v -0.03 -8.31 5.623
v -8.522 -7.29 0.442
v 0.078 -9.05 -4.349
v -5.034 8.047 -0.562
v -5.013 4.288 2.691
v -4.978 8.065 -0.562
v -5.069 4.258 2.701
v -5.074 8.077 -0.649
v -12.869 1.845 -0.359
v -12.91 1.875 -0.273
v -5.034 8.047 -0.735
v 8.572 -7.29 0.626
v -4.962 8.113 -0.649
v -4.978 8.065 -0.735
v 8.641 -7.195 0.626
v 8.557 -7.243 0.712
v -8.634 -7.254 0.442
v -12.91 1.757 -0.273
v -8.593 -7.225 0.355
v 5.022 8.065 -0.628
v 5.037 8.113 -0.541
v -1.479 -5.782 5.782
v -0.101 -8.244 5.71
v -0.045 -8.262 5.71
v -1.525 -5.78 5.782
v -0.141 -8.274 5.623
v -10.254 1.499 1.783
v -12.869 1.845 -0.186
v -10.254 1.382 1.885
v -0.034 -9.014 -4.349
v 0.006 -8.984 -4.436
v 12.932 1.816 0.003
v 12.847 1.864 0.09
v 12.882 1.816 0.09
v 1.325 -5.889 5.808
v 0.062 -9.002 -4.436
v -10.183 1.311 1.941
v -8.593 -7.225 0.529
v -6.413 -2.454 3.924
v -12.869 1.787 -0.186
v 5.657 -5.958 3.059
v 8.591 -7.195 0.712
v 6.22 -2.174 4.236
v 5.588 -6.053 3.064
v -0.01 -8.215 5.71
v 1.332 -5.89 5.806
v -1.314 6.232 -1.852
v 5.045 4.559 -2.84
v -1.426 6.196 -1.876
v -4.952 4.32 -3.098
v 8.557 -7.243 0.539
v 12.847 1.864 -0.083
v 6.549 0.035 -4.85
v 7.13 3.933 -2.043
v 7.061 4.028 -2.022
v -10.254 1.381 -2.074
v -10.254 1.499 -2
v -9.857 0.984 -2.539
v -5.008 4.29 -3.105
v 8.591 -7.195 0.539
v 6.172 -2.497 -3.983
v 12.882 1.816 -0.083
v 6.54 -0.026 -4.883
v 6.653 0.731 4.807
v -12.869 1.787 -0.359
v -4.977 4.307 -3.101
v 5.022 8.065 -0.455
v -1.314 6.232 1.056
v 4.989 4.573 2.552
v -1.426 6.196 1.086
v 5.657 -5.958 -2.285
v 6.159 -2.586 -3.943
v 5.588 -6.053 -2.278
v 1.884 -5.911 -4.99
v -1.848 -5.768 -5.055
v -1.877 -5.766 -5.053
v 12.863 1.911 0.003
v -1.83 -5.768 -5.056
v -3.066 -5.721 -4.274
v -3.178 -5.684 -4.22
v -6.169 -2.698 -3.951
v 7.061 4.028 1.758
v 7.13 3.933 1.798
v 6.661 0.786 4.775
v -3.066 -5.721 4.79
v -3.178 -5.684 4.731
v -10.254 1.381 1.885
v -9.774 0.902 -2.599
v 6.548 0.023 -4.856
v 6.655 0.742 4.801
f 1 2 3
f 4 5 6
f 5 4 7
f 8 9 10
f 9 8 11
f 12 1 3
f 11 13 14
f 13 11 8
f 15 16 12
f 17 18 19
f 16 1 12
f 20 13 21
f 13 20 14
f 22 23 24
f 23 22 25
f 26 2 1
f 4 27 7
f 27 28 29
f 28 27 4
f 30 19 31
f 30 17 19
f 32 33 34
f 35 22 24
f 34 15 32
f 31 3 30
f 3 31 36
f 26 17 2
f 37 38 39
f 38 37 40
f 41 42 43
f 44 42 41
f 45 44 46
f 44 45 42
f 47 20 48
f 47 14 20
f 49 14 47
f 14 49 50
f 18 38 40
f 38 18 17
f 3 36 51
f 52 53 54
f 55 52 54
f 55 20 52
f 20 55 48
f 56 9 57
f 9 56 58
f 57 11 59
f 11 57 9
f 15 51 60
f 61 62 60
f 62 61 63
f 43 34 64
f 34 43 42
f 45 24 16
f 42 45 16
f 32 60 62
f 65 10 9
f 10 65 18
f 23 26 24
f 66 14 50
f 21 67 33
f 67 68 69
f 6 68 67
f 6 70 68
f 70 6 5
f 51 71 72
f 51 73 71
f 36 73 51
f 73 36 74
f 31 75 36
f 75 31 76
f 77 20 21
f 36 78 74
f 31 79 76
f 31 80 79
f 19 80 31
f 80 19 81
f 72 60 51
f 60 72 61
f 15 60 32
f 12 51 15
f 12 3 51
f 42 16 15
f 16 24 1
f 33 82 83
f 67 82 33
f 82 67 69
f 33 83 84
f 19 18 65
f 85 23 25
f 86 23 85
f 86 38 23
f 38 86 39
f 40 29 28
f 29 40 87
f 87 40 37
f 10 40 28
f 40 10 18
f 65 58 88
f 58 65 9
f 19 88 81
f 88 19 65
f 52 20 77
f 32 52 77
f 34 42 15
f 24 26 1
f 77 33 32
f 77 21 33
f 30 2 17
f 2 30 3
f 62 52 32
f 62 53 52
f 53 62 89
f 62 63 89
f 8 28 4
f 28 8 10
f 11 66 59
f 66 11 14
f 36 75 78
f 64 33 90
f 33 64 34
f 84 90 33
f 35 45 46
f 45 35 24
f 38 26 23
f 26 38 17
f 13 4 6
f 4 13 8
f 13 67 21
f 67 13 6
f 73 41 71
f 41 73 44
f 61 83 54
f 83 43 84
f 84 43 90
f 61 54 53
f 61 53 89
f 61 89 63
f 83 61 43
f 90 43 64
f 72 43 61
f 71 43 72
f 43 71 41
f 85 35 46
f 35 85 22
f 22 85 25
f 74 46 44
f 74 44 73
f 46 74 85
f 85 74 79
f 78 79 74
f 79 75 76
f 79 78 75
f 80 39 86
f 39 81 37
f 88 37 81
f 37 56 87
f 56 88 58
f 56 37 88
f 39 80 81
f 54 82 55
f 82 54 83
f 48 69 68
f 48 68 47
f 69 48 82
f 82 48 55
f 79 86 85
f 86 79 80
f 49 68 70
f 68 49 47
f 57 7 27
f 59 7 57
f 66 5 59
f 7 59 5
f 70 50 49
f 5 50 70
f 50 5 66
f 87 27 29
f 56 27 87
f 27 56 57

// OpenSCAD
// Auto-generated OpenSCAD file

    inner_points = 10*[[-0.13450932832646978, 0.6137208793216535, -0.49999999999996475], [-0.30970268855061545, -0.5625709645316335, -0.5000000000000352], [-0.13450932832643542, 0.6137208793215885, 0.5000000000000352], [-0.3097026885505811, -0.5625709645316985, 0.49999999999996475], [-0.4022234175933843, 0.052401101187175045, -1.283102338831261], [-0.40222341759329616, 0.05240110118700812, 1.283102338831277], [0.4915267827134717, -0.08071135862540943, -0.8547430824889966], [0.49152678271353045, -0.08071135862552062, 0.8547430824889337], [-1.017331462216076, 0.14401343855176083, -0.499999999999965], [-1.0173314622160416, 0.1440134385516957, 0.500000000000035], [0.7029977653621209, 0.39330793047033674, -7.860303774857193e-15], [0.555685674258319, -0.5957821300472206, -6.713421756971425e-14]];

    outer_points = 10*[[-0.4935961942844095, -0.04399878007182188, -0.5983441385906083], [-0.5063460204819994, 0.04399878007182188, 0.5875939233346719], [0.5063460204819994, -0.04399878007182188, -0.5875939233346719], [0.4935961942844095, 0.04399878007182188, 0.5983441385906083], [-1.2828833411617955, 0.18160496168964152, -0.027267303587311748], [1.283173047764001, 0.18160496168964152, 0.00031994908835159333], [-0.8552676058642261, -0.7195265371946491, 0.04419460685783971], [0.8541197760563402, -0.7195265371946491, 0.06257195110839778], [-0.49933157435504716, 0.8017930567931236, -0.06486192322812147], [0.5006106404113617, 0.8017930567931236, -0.05411170797218501], [0.004675625240909675, -0.8954762230599844, -0.43490804114188575], [-0.006045121001836061, -0.8214830958078585, 0.5622930833658284]];

    // Convex hull for inner set (I)
    module inner_hull() {
        hull() {
            for (p = inner_points) {
                translate(p) sphere(r=0.1);
            }
        }
    }

    // Convex hull for outer set (O) minus inner hull (O \ I)
    module outer_minus_inner() {
        difference() {
            hull() {
                for (p = outer_points) {
                    translate(p) sphere(r=0.1);
                }
            }
            inner_hull(); // Subtract inner hull
        }
    }

    // Convex hull for outer set (O) minus all translated inner hulls
    module outer_minus_AllTranslationInner() {
        difference() {
            hull() {
                for (p = outer_points) {
                    translate(p) sphere(r=0.1);
                }
            }
            hull() {
                translate([0,0,50]) inner_hull();
                translate([0,0,-50]) inner_hull();
            }; // Subtract translated inner hulls
        }
    }

    // Difference between outer_minus_inner and outer_minus_AllTranslationInner
    module outer_minus_inner_diff() {
        difference() {
            // Outer minus inner
            difference() {
                hull() {
                    for (p = outer_points) {
                        translate(p) sphere(r=0.1);
                    }
                }
                inner_hull();
            }

            // Subtract Outer minus AllTranslationInner
            difference() {
                hull() {
                    for (p = outer_points) {
                        translate(p) sphere(r=0.1);
                    }
                }
                hull() {
                    translate([0,0,50]) inner_hull();
                    translate([0,0,-50]) inner_hull();
                };
            }
        }
    }

    // Rendering all with colors applied
    color([0, 1, 0, 1]) outer_minus_AllTranslationInner(); // Opaque green
    
